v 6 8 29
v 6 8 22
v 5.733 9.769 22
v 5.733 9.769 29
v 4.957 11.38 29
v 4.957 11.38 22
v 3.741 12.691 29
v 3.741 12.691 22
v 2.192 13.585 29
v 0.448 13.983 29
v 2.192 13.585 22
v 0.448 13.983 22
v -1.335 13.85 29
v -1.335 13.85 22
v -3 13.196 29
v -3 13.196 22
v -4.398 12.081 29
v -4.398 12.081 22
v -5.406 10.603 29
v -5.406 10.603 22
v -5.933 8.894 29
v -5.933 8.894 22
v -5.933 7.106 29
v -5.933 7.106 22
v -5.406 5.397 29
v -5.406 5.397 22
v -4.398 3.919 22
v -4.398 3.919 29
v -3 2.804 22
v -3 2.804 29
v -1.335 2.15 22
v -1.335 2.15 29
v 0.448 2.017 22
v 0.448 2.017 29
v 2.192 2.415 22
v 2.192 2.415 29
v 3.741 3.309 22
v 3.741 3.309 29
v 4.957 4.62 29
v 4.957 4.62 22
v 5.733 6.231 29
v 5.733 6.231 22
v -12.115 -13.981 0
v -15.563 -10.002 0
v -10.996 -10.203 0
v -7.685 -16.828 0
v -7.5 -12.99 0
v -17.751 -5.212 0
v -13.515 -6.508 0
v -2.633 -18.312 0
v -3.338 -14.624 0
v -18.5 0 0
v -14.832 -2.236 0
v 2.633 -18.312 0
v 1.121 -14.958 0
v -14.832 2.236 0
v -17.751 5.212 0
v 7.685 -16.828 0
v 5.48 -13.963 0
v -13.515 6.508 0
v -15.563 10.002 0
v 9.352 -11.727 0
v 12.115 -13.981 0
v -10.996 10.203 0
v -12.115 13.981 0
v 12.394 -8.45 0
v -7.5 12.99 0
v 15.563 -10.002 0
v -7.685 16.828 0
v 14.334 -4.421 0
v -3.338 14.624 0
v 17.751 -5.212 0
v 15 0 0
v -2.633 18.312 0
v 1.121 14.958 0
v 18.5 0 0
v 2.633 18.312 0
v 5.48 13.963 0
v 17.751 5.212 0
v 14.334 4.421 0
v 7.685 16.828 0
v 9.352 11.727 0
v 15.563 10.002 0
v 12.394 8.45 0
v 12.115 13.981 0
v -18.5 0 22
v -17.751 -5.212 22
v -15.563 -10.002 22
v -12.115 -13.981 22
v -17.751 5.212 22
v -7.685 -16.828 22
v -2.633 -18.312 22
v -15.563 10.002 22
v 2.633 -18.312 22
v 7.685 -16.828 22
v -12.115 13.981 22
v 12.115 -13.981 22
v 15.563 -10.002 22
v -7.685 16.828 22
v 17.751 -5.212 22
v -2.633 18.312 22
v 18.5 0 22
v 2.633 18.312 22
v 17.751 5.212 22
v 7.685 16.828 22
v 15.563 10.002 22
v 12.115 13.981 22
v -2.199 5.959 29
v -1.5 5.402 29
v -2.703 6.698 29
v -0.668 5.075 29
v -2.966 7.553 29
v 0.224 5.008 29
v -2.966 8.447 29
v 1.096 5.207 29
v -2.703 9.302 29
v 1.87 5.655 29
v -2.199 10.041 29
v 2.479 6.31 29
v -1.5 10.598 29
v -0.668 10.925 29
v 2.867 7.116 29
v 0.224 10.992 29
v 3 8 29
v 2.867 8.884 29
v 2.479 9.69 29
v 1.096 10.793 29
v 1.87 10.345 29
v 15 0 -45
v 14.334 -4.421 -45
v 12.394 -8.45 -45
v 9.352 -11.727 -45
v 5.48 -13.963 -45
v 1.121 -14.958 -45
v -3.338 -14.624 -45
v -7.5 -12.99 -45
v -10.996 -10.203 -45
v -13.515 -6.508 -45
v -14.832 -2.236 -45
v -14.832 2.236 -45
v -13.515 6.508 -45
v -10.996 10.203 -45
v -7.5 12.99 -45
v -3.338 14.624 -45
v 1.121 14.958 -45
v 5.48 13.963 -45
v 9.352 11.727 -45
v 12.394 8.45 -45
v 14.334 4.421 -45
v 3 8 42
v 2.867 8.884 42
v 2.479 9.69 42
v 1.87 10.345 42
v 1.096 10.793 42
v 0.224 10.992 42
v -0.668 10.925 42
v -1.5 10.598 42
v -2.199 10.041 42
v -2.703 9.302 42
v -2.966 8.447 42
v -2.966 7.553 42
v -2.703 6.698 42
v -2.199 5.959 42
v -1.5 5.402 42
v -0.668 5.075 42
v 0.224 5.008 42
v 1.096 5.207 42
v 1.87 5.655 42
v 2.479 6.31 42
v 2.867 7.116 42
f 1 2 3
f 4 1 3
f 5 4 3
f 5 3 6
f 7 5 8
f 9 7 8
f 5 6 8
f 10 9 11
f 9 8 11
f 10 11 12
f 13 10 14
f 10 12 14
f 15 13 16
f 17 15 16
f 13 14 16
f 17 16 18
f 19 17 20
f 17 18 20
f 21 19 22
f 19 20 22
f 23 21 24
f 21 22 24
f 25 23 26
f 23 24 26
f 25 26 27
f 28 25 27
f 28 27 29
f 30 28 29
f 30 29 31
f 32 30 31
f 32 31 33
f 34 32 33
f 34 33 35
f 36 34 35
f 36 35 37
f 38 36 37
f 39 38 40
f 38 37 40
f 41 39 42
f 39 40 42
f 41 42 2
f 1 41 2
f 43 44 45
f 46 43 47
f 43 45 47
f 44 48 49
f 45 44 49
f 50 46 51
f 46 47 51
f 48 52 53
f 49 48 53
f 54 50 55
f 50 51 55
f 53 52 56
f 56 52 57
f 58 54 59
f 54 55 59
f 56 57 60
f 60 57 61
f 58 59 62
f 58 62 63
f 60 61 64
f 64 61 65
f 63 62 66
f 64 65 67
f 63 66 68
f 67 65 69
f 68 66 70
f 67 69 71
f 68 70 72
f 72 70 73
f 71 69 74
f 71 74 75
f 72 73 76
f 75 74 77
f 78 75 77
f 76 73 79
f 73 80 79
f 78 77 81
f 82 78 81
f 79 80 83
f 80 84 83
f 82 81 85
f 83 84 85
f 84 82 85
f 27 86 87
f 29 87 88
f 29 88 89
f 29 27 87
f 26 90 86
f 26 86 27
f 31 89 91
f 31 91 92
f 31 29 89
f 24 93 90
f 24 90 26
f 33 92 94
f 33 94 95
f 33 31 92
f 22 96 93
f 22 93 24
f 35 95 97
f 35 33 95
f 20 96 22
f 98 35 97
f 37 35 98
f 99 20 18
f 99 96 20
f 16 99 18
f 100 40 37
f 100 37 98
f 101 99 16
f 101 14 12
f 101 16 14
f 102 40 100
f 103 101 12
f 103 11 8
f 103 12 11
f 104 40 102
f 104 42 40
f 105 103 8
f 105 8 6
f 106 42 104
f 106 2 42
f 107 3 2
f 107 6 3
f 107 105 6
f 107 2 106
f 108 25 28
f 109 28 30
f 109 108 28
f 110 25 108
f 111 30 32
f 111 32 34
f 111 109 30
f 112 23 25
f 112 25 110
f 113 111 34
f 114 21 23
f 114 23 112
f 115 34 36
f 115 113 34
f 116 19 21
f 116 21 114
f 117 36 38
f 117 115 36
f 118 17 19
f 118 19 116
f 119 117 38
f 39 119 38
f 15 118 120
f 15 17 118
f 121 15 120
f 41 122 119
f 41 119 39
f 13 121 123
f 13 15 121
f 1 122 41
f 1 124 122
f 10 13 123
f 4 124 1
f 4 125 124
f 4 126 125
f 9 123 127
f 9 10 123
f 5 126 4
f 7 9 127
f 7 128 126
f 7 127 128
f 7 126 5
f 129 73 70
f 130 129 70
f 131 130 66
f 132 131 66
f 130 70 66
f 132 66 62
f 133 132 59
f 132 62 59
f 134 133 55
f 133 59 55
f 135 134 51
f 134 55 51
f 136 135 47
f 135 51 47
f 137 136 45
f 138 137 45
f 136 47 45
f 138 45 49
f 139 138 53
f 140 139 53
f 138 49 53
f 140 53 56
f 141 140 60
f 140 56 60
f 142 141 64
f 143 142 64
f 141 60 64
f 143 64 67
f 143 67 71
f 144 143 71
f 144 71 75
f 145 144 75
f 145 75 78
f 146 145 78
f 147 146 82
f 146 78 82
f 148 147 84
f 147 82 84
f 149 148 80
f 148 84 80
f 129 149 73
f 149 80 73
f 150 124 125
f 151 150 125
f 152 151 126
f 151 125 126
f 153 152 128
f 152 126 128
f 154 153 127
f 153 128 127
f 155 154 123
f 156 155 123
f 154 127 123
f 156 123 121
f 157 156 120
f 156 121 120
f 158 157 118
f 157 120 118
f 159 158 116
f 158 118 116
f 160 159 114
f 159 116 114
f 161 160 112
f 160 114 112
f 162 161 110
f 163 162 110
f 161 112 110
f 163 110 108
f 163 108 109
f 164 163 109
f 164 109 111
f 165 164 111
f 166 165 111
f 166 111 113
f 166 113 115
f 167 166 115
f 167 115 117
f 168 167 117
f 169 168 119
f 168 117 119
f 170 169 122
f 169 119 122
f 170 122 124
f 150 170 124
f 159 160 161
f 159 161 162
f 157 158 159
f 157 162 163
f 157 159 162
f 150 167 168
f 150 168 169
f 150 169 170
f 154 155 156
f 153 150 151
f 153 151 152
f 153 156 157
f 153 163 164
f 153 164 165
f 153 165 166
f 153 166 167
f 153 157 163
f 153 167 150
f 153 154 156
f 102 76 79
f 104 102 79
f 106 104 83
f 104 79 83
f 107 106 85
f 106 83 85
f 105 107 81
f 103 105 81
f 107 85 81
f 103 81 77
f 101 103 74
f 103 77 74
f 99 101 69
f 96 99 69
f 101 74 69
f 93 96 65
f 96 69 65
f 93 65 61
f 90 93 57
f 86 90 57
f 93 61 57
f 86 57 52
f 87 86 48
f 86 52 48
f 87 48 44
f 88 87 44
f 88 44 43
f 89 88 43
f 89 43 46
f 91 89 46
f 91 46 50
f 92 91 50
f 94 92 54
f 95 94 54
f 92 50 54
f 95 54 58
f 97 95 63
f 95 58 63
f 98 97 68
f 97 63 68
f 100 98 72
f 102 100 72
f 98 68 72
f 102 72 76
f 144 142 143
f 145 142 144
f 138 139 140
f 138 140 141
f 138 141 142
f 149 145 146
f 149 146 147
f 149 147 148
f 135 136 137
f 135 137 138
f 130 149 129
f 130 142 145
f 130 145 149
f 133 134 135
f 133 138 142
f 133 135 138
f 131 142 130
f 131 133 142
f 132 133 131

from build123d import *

# Parameters (mm, degrees)
F0_R     = 18.5
F1_DEPTH = 22
F2_R     = 15
F3_DEPTH = 45
F4_R     = 6
F5_DEPTH = 7
F6_R     = 3
F7_DEPTH = 13


with BuildPart() as f1:
    # F0 (on Top) → F1 (new body)
    with BuildSketch(Plane.XY):
        Circle(F0_R)
    extrude(amount=F1_DEPTH)

    # F2 (on face) → F3 (join)
    with BuildSketch(Plane(origin=(0, 0, 0), x_dir=(1, 0, 0), z_dir=(0, 0, -1))):
        Circle(F2_R)
    extrude(amount=F3_DEPTH)

    # F4 (on face) → F5 (join)
    with BuildSketch(Plane.XY.offset(22)):
        with Locations((0, 8)):
            Circle(F4_R)
    extrude(amount=F5_DEPTH)

    # F6 (on face) → F7 (join)
    with BuildSketch(Plane.XY.offset(29)):
        with Locations((0, 8)):
            Circle(F6_R)
    extrude(amount=F7_DEPTH)


solid = f1.part
